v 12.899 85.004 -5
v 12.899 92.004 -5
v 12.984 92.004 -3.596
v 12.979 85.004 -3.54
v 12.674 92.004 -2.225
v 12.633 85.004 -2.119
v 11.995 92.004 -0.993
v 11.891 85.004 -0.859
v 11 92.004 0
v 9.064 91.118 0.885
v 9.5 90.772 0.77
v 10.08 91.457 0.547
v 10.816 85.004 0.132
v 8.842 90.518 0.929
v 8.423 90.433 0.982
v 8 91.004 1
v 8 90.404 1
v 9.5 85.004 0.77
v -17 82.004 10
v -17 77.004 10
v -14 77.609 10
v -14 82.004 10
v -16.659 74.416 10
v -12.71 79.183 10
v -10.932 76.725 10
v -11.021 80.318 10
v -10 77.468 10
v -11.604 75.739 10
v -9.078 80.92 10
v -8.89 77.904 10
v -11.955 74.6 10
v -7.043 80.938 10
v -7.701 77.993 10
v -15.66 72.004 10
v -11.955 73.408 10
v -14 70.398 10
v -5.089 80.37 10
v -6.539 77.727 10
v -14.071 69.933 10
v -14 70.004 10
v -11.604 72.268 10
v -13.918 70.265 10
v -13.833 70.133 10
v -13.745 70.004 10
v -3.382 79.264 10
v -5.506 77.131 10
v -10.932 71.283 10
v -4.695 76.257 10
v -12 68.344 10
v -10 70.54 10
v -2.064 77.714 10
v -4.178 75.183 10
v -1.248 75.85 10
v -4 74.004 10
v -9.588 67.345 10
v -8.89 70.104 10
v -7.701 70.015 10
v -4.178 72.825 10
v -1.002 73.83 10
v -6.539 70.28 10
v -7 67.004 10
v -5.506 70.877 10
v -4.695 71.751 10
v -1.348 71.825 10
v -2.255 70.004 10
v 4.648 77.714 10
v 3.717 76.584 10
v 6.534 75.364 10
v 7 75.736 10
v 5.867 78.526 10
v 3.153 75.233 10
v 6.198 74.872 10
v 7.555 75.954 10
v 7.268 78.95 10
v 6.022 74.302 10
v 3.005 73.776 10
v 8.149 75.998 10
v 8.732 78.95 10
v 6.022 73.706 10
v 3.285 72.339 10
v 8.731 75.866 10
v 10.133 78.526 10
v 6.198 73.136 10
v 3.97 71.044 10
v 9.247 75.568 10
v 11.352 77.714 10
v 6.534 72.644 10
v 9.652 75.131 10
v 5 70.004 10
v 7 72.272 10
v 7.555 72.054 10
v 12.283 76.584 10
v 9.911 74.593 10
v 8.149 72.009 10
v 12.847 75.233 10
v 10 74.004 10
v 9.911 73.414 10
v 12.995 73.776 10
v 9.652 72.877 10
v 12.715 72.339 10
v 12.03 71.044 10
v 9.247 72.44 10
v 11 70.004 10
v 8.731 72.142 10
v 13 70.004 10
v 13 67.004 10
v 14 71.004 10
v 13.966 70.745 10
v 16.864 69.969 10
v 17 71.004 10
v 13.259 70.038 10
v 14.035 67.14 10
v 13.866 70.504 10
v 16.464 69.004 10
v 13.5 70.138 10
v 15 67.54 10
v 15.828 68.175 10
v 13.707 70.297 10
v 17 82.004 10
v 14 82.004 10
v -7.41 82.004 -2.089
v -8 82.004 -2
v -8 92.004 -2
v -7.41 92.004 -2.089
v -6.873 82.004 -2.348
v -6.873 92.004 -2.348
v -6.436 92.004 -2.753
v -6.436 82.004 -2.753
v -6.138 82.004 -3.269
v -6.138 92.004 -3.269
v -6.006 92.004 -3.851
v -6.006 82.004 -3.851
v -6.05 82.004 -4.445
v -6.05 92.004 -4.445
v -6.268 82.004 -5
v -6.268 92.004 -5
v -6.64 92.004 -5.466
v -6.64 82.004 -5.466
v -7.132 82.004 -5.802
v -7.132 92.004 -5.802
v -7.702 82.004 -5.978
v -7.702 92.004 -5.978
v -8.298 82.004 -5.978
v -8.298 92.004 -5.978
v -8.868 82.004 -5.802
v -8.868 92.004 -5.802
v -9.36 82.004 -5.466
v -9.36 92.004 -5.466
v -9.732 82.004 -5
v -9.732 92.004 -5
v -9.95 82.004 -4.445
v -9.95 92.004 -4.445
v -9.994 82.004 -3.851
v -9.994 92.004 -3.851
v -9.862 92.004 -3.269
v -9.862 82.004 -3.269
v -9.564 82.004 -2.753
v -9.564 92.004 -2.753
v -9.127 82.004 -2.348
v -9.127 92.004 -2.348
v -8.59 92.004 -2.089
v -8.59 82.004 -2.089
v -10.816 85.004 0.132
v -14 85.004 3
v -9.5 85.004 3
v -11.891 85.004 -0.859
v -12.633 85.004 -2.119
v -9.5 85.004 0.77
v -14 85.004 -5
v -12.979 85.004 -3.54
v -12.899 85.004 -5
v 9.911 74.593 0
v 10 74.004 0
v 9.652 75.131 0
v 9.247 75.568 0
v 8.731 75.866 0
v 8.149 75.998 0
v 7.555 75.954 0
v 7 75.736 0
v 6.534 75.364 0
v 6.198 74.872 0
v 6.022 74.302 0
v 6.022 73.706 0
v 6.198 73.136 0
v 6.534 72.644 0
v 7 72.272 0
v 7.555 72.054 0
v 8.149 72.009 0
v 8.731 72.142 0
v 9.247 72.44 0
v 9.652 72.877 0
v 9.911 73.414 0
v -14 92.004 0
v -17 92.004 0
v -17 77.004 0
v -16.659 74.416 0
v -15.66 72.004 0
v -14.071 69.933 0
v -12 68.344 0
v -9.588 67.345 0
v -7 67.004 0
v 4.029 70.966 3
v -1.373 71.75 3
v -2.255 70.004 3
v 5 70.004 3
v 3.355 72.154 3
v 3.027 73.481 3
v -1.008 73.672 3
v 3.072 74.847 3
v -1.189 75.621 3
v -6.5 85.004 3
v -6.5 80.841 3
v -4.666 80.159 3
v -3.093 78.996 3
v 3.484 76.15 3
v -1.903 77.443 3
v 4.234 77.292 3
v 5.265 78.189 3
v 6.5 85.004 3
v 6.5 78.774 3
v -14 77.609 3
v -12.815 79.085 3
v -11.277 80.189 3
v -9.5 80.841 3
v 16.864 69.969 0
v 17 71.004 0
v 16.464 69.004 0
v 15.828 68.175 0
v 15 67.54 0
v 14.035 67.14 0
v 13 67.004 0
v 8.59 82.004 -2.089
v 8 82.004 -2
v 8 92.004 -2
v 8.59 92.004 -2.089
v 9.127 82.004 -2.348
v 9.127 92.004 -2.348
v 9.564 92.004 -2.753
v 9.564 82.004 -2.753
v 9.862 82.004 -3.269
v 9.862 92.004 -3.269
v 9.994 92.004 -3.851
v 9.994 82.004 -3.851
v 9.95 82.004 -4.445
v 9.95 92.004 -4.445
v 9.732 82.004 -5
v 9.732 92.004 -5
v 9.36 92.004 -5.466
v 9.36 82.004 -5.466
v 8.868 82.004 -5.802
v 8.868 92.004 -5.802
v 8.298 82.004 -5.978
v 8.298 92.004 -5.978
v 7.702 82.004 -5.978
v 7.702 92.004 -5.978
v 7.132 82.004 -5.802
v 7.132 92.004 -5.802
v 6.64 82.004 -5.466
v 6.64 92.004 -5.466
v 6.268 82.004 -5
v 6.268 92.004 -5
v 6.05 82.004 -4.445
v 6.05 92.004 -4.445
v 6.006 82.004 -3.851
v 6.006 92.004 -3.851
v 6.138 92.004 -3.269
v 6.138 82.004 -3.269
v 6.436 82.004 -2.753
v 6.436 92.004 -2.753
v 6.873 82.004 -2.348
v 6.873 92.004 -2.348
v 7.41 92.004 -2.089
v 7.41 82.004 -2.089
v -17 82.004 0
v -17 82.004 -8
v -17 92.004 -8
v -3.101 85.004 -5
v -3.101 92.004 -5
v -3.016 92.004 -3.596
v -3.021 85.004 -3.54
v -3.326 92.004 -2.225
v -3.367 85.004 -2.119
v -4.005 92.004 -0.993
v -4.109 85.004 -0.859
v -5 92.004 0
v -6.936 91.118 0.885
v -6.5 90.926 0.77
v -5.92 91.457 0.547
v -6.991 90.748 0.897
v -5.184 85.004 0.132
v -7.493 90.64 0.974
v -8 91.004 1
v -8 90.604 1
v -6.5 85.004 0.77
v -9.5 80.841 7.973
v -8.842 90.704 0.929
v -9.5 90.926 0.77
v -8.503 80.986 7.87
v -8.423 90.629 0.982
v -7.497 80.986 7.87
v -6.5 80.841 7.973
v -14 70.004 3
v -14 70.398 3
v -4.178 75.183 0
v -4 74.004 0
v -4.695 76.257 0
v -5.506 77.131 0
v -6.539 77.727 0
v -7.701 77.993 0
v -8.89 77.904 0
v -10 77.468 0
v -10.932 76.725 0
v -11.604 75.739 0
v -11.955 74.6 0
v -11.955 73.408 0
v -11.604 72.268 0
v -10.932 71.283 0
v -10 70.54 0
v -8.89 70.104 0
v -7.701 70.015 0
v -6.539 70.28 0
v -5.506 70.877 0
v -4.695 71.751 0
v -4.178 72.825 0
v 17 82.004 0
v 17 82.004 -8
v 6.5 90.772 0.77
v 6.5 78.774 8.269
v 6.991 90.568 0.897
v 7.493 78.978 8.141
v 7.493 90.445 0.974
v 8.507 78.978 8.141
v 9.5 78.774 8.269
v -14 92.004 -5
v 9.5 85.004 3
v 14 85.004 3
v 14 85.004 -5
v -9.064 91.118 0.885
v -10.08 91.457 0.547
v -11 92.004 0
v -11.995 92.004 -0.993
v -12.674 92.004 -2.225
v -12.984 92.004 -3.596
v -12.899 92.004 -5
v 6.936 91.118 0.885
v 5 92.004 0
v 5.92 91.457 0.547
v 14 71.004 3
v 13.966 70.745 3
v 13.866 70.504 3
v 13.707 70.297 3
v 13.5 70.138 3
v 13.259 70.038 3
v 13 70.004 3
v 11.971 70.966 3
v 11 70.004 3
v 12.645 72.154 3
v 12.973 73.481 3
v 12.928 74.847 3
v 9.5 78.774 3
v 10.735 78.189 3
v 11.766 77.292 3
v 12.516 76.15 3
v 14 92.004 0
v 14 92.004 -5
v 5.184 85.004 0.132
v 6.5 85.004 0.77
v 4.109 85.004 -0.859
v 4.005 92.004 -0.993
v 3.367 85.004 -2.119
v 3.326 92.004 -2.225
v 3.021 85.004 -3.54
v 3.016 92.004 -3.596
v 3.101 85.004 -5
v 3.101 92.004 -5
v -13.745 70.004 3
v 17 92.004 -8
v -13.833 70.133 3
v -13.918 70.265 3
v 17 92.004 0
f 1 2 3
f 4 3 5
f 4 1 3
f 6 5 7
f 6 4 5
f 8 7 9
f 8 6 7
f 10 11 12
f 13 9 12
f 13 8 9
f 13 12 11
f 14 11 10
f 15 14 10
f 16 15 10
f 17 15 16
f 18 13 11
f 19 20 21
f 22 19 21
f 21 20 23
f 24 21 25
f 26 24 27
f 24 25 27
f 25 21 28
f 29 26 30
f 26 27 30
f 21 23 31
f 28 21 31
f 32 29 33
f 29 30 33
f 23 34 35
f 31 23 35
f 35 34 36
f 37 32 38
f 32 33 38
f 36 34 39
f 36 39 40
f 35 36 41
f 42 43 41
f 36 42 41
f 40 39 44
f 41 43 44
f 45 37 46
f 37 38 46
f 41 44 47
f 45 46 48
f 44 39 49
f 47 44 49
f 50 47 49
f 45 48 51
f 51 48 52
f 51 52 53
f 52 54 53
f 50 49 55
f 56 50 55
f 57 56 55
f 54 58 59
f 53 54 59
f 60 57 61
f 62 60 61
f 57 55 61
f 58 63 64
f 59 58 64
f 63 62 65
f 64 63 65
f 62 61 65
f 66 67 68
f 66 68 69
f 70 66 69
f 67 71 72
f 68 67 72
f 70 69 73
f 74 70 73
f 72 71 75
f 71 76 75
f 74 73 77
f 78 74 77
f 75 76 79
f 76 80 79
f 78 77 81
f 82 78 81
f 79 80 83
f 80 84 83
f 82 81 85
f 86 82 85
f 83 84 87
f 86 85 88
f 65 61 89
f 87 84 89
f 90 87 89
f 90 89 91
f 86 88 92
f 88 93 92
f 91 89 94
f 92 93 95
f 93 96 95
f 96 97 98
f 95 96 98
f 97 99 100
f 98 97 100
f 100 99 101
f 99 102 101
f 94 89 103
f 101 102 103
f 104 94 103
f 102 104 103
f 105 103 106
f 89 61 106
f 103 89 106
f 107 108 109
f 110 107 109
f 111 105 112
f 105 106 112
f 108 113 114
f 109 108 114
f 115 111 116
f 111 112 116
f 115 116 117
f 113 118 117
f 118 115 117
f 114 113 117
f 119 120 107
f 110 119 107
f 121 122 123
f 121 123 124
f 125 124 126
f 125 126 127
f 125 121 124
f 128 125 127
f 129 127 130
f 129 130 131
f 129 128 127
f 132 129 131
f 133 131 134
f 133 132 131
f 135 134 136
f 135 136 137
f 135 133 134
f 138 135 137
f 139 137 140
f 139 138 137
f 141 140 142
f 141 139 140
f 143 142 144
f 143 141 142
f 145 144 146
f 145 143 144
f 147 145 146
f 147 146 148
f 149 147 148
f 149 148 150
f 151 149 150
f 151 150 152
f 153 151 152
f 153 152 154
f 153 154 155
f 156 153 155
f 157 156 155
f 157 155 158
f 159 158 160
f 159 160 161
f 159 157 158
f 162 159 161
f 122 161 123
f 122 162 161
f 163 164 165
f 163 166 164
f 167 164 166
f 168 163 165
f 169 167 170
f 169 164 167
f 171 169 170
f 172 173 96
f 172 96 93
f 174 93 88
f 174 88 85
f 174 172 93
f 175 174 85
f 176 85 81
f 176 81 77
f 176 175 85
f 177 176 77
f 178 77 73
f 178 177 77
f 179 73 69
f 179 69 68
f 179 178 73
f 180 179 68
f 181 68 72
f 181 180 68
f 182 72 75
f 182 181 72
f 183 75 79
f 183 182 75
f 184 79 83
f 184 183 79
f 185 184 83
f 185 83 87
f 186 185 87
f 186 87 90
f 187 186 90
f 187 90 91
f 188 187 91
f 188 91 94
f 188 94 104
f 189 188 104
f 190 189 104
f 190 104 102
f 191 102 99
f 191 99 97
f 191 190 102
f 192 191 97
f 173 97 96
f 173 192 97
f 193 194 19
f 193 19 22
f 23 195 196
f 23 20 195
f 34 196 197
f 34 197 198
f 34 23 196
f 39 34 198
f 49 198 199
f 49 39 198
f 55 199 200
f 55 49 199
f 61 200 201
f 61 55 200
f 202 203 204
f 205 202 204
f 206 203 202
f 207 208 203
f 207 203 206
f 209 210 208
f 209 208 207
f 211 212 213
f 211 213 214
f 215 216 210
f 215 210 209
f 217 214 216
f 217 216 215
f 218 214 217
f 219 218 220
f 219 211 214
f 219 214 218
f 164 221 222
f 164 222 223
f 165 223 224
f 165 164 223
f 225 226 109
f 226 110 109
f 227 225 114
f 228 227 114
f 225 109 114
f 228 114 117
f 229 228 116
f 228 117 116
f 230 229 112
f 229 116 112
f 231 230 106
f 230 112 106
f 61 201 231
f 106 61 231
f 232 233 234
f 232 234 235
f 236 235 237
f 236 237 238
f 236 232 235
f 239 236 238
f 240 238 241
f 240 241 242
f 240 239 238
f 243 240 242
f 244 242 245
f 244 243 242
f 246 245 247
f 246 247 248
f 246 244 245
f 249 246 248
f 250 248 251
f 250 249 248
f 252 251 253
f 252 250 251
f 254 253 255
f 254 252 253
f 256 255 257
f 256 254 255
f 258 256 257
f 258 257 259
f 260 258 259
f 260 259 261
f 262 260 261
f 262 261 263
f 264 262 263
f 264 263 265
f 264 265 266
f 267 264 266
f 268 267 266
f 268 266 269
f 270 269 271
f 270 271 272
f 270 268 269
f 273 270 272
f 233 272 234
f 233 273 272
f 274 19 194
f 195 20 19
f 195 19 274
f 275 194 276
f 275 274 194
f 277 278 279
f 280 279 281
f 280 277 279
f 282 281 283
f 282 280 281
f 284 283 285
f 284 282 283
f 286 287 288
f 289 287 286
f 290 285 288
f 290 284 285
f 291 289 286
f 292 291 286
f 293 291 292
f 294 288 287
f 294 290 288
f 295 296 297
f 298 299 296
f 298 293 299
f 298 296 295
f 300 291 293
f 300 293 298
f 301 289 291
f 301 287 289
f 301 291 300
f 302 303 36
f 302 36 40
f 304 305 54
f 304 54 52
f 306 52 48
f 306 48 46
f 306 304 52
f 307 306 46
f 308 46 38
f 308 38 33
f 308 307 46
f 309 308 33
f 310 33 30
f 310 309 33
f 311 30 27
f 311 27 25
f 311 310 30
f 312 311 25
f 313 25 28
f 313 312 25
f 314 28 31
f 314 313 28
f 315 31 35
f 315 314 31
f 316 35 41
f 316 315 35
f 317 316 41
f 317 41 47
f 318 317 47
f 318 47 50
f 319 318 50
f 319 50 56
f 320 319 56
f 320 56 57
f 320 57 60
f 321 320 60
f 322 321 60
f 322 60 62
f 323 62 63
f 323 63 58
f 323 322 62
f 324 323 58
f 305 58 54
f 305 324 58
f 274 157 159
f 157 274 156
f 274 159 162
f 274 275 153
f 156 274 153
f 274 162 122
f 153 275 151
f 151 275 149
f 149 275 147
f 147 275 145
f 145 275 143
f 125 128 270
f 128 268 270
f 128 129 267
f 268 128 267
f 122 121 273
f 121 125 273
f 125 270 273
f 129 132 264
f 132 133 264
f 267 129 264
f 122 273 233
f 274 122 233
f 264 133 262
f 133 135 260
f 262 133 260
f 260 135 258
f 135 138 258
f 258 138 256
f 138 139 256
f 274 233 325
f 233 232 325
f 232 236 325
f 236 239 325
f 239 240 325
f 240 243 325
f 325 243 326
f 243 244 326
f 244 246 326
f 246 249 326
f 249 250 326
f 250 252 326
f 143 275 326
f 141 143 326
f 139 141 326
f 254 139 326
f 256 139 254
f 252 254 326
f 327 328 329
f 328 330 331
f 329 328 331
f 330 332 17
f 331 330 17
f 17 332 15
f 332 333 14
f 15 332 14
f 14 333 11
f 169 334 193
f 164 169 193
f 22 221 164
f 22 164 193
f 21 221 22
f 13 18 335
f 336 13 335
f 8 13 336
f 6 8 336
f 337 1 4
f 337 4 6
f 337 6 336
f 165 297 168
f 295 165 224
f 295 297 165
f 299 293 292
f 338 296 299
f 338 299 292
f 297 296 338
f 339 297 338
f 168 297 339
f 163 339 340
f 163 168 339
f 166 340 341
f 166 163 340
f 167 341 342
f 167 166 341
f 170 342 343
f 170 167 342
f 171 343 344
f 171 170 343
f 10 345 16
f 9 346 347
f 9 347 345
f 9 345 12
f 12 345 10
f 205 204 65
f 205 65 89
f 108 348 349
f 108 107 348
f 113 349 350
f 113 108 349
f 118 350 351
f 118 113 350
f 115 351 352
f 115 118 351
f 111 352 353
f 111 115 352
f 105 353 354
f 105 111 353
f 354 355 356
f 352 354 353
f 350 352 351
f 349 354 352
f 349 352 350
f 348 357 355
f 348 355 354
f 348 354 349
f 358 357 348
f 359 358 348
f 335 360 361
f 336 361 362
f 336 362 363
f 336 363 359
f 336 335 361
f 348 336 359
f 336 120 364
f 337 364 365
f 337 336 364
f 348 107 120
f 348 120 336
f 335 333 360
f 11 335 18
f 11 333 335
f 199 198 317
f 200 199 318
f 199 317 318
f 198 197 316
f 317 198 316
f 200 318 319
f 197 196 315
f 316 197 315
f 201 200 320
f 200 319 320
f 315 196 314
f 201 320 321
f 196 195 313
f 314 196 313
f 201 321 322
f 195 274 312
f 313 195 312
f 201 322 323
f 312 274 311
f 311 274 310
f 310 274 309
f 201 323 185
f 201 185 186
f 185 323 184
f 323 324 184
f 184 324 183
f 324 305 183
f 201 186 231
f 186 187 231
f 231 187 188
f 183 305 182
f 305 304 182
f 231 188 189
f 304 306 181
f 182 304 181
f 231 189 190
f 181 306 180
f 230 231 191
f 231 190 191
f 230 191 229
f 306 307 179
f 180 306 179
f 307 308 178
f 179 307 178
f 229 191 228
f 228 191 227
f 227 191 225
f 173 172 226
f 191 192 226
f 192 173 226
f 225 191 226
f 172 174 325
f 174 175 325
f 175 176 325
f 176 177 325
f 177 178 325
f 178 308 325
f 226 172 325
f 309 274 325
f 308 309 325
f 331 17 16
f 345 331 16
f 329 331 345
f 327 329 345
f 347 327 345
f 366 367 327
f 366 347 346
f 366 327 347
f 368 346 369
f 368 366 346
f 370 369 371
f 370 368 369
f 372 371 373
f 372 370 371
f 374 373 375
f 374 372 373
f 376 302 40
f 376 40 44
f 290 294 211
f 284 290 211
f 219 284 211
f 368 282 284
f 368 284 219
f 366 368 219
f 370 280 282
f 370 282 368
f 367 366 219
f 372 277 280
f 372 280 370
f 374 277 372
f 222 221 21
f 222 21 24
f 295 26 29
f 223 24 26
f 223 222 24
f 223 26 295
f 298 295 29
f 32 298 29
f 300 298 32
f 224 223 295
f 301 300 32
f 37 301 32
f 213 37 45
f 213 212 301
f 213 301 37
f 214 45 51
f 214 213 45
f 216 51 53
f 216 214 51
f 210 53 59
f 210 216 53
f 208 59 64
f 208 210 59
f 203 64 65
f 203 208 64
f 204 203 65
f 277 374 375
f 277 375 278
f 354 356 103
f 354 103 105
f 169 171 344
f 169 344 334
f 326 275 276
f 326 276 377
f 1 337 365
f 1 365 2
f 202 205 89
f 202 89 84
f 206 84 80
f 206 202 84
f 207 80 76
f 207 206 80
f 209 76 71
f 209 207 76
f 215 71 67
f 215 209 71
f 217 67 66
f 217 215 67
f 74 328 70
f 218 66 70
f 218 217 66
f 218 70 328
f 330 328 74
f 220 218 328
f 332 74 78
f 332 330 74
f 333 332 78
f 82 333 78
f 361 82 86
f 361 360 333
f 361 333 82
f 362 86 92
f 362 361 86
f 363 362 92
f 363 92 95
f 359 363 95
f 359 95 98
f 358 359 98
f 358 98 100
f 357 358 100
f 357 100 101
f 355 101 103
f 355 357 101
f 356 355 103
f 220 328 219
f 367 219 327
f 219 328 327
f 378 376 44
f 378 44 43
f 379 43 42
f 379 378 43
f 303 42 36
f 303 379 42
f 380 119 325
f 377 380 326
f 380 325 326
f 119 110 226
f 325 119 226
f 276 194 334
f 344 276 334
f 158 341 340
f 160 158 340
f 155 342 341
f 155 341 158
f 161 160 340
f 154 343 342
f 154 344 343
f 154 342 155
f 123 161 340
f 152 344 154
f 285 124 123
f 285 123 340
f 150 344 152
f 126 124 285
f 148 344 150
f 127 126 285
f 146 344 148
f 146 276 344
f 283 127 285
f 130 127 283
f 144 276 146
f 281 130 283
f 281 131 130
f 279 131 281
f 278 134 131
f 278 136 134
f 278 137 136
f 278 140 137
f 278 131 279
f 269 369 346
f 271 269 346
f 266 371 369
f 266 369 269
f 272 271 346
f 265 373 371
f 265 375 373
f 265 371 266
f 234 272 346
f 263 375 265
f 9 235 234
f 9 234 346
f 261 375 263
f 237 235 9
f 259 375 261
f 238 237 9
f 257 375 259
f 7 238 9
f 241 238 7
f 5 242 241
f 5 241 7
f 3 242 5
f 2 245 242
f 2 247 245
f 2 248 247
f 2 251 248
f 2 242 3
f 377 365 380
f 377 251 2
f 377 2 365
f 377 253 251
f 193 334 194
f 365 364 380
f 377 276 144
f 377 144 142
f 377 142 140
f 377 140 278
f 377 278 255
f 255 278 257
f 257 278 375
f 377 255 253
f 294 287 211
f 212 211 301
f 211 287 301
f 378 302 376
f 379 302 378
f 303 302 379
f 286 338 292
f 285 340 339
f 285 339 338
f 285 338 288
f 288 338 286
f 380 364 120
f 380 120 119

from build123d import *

# Parameters (mm, degrees)
ESQUISSE1_W        = 34
ESQUISSE1_H        = 15
ESQUISSE1_R        = 4
ESQUISSE1_R_2      = 2
BOSS_EXTRU_2_DEPTH = 10
ESQUISSE2_W        = 34
ESQUISSE2_H        = 18
ESQUISSE2_R        = 2
BOSS_EXTRU_3_DEPTH = 10
CHANFREIN1_SIZE    = 10
COQUE4_START       = 3
COQUE4_DEPTH       = 7
COQUE4_START_2     = 1
COQUE4_2_OUTLINE_W = 28
COQUE4_2_OUTLINE_H = 7
COQUE4_2_DEPTH     = 2
COQUE4_START_3     = 85.003902516
COQUE4_3_DEPTH     = 7
NERVURE3_REACH     = 97.863
ESQUISSE4_WALL_W   = 212.593996784
ESQUISSE4_WALL_H   = 3
CONG_1_R           = 10
CONG_2_R           = 1
CONG_3_R           = 4
NERVURE4_REACH     = 97.863
ESQUISSE6_WALL_W   = 210.930685054
ESQUISSE6_WALL_H   = 3


with BuildPart() as part:
    # Esquisse1 → Boss.-Extru.2 (new body)
    with BuildSketch(Plane.XY):
        with Locations((0, 74.503902516)):
            Rectangle(ESQUISSE1_W, ESQUISSE1_H)
        with Locations((-8, 74.003902516)):
            Circle(ESQUISSE1_R, mode=Mode.SUBTRACT)
        with Locations((8, 74.003902516)):
            Circle(ESQUISSE1_R_2, mode=Mode.SUBTRACT)
    extrude(amount=BOSS_EXTRU_2_DEPTH)

    # Esquisse2 → Boss.-Extru.3 (add)
    with BuildSketch(Plane(origin=(0, 82.003902516, 0), x_dir=(1, 0, 0), z_dir=(0, 1, 0))):
        with Locations((0, -1)):
            Rectangle(ESQUISSE2_W, ESQUISSE2_H)
        with Locations(Location((-8, 4, 0), (0, 0, 270))):
            Circle(ESQUISSE2_R, mode=Mode.SUBTRACT)
        with Locations(Location((8, 4, 0), (0, 0, 270))):
            Circle(ESQUISSE2_R, mode=Mode.SUBTRACT)
    extrude(amount=BOSS_EXTRU_3_DEPTH)

    # Chanfrein1
    chanfrein1_edges = [part.edges().sort_by_distance(p)[0] for p in [
        (0, 92.003902516, 10),
    ]]
    chamfer(chanfrein1_edges, length=CHANFREIN1_SIZE)

    # Coque4: read off the stored shape, not the designer's step
    # Coque4 outline → Coque4 (cut)
    with BuildSketch(Plane.XY.offset(COQUE4_START)):
        with BuildLine():
            Line((14, 70.003902516), (14, 92.003902516))
            Line((14, 92.003902516), (-14, 92.003902516))
            Line((-14, 92.003902516), (-14, 77.609453792))
            ThreePointArc((-14, 77.609453792), (-4.195080209, 79.87949486), (-2.255437353, 70.003902516))
            Line((-2.255437353, 70.003902516), (5, 70.003902516))
            ThreePointArc((5, 70.003902516), (8, 79.003902516), (11, 70.003902516))
            Line((11, 70.003902516), (14, 70.003902516))
        make_face()
        with BuildLine():
            Line((-14, 70.003902516), (-13.744562647, 70.003902516))
            ThreePointArc((-13.744562647, 70.003902516), (-13.875592344, 70.198982726), (-14, 70.398351241))
            Line((-14, 70.398351241), (-14, 70.003902516))
        make_face()
    extrude(amount=COQUE4_DEPTH, mode=Mode.SUBTRACT)

    # Coque4 2 outline → Coque4 2 (cut)
    with BuildSketch(Plane.XY.offset(COQUE4_START_2)):
        with Locations((0, 88.503902516)):
            Rectangle(COQUE4_2_OUTLINE_W, COQUE4_2_OUTLINE_H)
    extrude(amount=COQUE4_2_DEPTH, mode=Mode.SUBTRACT)

    # Coque4 3 outline → Coque4 3 (cut)
    with BuildSketch(Plane(origin=(0, 0, 0), x_dir=(1, 0, 0), z_dir=(0, 1, 0)).offset(COQUE4_START_3)):
        with BuildLine():
            Line((14, 5), (12.898979486, 5))
            ThreePointArc((12.898979486, 5), (11.872983347, 0.83772234), (8, -1))
            Line((8, -1), (14, -1))
            Line((14, -1), (14, 5))
        make_face()
        with BuildLine():
            Line((-14, -1), (-8, -1))
            ThreePointArc((-8, -1), (-11.872983346, 0.83772234), (-12.898979485, 5))
            Line((-12.898979485, 5), (-14, 5))
            Line((-14, 5), (-14, -1))
        make_face()
        with BuildLine():
            Line((-8, -1), (8, -1))
            ThreePointArc((8, -1), (4.127016654, 0.83772234), (3.101020515, 5))
            Line((3.101020515, 5), (-3.101020514, 5))
            ThreePointArc((-3.101020514, 5), (-4.127016653, 0.83772234), (-8, -1))
        make_face()
    extrude(amount=COQUE4_3_DEPTH, mode=Mode.SUBTRACT)

    # Esquisse4 wall → Nervure3 (add, up to next)
    with BuildSketch(Plane(origin=(8, 84.003902516, 5), x_dir=(0, 0.847998304005, -0.529998940003), z_dir=(0, -0.529998940003, -0.847998304005)), mode=Mode.PRIVATE) as nervure3_sk1:
        Rectangle(ESQUISSE4_WALL_W, ESQUISSE4_WALL_H)
    nervure3_tool1 = extrude(nervure3_sk1.sketch, amount=NERVURE3_REACH, mode=Mode.PRIVATE) - part.part
    add(nervure3_tool1.solids().sort_by_distance((8, 84.003902516, 5))[0])

    # Congé1
    cong_1_edges = [part.edges().sort_by_distance(p)[0] for p in [
        (-17, 67.003902516, 5),
    ]]
    fillet(cong_1_edges, radius=CONG_1_R)

    # Congé2
    cong_2_edges = [part.edges().sort_by_distance(p)[0] for p in [
        (14, 70.003902516, 6.5),
    ]]
    fillet(cong_2_edges, radius=CONG_2_R)

    # Congé3
    cong_3_edges = [part.edges().sort_by_distance(p)[0] for p in [
        (17, 67.003902516, 5),
    ]]
    fillet(cong_3_edges, radius=CONG_3_R)

    # Esquisse6 wall → Nervure4 (add, up to next)
    with BuildSketch(Plane(origin=(-8, 85.003902516, 5), x_dir=(0, -0.813733471207, 0.581238193719), z_dir=(0, 0.581238193719, 0.813733471207)), mode=Mode.PRIVATE) as nervure4_sk1:
        Rectangle(ESQUISSE6_WALL_W, ESQUISSE6_WALL_H)
    nervure4_tool1 = extrude(nervure4_sk1.sketch, amount=-NERVURE4_REACH, mode=Mode.PRIVATE) - part.part
    add(nervure4_tool1.solids().sort_by_distance((-8, 85.003902516, 5))[0])


solid = part.part
